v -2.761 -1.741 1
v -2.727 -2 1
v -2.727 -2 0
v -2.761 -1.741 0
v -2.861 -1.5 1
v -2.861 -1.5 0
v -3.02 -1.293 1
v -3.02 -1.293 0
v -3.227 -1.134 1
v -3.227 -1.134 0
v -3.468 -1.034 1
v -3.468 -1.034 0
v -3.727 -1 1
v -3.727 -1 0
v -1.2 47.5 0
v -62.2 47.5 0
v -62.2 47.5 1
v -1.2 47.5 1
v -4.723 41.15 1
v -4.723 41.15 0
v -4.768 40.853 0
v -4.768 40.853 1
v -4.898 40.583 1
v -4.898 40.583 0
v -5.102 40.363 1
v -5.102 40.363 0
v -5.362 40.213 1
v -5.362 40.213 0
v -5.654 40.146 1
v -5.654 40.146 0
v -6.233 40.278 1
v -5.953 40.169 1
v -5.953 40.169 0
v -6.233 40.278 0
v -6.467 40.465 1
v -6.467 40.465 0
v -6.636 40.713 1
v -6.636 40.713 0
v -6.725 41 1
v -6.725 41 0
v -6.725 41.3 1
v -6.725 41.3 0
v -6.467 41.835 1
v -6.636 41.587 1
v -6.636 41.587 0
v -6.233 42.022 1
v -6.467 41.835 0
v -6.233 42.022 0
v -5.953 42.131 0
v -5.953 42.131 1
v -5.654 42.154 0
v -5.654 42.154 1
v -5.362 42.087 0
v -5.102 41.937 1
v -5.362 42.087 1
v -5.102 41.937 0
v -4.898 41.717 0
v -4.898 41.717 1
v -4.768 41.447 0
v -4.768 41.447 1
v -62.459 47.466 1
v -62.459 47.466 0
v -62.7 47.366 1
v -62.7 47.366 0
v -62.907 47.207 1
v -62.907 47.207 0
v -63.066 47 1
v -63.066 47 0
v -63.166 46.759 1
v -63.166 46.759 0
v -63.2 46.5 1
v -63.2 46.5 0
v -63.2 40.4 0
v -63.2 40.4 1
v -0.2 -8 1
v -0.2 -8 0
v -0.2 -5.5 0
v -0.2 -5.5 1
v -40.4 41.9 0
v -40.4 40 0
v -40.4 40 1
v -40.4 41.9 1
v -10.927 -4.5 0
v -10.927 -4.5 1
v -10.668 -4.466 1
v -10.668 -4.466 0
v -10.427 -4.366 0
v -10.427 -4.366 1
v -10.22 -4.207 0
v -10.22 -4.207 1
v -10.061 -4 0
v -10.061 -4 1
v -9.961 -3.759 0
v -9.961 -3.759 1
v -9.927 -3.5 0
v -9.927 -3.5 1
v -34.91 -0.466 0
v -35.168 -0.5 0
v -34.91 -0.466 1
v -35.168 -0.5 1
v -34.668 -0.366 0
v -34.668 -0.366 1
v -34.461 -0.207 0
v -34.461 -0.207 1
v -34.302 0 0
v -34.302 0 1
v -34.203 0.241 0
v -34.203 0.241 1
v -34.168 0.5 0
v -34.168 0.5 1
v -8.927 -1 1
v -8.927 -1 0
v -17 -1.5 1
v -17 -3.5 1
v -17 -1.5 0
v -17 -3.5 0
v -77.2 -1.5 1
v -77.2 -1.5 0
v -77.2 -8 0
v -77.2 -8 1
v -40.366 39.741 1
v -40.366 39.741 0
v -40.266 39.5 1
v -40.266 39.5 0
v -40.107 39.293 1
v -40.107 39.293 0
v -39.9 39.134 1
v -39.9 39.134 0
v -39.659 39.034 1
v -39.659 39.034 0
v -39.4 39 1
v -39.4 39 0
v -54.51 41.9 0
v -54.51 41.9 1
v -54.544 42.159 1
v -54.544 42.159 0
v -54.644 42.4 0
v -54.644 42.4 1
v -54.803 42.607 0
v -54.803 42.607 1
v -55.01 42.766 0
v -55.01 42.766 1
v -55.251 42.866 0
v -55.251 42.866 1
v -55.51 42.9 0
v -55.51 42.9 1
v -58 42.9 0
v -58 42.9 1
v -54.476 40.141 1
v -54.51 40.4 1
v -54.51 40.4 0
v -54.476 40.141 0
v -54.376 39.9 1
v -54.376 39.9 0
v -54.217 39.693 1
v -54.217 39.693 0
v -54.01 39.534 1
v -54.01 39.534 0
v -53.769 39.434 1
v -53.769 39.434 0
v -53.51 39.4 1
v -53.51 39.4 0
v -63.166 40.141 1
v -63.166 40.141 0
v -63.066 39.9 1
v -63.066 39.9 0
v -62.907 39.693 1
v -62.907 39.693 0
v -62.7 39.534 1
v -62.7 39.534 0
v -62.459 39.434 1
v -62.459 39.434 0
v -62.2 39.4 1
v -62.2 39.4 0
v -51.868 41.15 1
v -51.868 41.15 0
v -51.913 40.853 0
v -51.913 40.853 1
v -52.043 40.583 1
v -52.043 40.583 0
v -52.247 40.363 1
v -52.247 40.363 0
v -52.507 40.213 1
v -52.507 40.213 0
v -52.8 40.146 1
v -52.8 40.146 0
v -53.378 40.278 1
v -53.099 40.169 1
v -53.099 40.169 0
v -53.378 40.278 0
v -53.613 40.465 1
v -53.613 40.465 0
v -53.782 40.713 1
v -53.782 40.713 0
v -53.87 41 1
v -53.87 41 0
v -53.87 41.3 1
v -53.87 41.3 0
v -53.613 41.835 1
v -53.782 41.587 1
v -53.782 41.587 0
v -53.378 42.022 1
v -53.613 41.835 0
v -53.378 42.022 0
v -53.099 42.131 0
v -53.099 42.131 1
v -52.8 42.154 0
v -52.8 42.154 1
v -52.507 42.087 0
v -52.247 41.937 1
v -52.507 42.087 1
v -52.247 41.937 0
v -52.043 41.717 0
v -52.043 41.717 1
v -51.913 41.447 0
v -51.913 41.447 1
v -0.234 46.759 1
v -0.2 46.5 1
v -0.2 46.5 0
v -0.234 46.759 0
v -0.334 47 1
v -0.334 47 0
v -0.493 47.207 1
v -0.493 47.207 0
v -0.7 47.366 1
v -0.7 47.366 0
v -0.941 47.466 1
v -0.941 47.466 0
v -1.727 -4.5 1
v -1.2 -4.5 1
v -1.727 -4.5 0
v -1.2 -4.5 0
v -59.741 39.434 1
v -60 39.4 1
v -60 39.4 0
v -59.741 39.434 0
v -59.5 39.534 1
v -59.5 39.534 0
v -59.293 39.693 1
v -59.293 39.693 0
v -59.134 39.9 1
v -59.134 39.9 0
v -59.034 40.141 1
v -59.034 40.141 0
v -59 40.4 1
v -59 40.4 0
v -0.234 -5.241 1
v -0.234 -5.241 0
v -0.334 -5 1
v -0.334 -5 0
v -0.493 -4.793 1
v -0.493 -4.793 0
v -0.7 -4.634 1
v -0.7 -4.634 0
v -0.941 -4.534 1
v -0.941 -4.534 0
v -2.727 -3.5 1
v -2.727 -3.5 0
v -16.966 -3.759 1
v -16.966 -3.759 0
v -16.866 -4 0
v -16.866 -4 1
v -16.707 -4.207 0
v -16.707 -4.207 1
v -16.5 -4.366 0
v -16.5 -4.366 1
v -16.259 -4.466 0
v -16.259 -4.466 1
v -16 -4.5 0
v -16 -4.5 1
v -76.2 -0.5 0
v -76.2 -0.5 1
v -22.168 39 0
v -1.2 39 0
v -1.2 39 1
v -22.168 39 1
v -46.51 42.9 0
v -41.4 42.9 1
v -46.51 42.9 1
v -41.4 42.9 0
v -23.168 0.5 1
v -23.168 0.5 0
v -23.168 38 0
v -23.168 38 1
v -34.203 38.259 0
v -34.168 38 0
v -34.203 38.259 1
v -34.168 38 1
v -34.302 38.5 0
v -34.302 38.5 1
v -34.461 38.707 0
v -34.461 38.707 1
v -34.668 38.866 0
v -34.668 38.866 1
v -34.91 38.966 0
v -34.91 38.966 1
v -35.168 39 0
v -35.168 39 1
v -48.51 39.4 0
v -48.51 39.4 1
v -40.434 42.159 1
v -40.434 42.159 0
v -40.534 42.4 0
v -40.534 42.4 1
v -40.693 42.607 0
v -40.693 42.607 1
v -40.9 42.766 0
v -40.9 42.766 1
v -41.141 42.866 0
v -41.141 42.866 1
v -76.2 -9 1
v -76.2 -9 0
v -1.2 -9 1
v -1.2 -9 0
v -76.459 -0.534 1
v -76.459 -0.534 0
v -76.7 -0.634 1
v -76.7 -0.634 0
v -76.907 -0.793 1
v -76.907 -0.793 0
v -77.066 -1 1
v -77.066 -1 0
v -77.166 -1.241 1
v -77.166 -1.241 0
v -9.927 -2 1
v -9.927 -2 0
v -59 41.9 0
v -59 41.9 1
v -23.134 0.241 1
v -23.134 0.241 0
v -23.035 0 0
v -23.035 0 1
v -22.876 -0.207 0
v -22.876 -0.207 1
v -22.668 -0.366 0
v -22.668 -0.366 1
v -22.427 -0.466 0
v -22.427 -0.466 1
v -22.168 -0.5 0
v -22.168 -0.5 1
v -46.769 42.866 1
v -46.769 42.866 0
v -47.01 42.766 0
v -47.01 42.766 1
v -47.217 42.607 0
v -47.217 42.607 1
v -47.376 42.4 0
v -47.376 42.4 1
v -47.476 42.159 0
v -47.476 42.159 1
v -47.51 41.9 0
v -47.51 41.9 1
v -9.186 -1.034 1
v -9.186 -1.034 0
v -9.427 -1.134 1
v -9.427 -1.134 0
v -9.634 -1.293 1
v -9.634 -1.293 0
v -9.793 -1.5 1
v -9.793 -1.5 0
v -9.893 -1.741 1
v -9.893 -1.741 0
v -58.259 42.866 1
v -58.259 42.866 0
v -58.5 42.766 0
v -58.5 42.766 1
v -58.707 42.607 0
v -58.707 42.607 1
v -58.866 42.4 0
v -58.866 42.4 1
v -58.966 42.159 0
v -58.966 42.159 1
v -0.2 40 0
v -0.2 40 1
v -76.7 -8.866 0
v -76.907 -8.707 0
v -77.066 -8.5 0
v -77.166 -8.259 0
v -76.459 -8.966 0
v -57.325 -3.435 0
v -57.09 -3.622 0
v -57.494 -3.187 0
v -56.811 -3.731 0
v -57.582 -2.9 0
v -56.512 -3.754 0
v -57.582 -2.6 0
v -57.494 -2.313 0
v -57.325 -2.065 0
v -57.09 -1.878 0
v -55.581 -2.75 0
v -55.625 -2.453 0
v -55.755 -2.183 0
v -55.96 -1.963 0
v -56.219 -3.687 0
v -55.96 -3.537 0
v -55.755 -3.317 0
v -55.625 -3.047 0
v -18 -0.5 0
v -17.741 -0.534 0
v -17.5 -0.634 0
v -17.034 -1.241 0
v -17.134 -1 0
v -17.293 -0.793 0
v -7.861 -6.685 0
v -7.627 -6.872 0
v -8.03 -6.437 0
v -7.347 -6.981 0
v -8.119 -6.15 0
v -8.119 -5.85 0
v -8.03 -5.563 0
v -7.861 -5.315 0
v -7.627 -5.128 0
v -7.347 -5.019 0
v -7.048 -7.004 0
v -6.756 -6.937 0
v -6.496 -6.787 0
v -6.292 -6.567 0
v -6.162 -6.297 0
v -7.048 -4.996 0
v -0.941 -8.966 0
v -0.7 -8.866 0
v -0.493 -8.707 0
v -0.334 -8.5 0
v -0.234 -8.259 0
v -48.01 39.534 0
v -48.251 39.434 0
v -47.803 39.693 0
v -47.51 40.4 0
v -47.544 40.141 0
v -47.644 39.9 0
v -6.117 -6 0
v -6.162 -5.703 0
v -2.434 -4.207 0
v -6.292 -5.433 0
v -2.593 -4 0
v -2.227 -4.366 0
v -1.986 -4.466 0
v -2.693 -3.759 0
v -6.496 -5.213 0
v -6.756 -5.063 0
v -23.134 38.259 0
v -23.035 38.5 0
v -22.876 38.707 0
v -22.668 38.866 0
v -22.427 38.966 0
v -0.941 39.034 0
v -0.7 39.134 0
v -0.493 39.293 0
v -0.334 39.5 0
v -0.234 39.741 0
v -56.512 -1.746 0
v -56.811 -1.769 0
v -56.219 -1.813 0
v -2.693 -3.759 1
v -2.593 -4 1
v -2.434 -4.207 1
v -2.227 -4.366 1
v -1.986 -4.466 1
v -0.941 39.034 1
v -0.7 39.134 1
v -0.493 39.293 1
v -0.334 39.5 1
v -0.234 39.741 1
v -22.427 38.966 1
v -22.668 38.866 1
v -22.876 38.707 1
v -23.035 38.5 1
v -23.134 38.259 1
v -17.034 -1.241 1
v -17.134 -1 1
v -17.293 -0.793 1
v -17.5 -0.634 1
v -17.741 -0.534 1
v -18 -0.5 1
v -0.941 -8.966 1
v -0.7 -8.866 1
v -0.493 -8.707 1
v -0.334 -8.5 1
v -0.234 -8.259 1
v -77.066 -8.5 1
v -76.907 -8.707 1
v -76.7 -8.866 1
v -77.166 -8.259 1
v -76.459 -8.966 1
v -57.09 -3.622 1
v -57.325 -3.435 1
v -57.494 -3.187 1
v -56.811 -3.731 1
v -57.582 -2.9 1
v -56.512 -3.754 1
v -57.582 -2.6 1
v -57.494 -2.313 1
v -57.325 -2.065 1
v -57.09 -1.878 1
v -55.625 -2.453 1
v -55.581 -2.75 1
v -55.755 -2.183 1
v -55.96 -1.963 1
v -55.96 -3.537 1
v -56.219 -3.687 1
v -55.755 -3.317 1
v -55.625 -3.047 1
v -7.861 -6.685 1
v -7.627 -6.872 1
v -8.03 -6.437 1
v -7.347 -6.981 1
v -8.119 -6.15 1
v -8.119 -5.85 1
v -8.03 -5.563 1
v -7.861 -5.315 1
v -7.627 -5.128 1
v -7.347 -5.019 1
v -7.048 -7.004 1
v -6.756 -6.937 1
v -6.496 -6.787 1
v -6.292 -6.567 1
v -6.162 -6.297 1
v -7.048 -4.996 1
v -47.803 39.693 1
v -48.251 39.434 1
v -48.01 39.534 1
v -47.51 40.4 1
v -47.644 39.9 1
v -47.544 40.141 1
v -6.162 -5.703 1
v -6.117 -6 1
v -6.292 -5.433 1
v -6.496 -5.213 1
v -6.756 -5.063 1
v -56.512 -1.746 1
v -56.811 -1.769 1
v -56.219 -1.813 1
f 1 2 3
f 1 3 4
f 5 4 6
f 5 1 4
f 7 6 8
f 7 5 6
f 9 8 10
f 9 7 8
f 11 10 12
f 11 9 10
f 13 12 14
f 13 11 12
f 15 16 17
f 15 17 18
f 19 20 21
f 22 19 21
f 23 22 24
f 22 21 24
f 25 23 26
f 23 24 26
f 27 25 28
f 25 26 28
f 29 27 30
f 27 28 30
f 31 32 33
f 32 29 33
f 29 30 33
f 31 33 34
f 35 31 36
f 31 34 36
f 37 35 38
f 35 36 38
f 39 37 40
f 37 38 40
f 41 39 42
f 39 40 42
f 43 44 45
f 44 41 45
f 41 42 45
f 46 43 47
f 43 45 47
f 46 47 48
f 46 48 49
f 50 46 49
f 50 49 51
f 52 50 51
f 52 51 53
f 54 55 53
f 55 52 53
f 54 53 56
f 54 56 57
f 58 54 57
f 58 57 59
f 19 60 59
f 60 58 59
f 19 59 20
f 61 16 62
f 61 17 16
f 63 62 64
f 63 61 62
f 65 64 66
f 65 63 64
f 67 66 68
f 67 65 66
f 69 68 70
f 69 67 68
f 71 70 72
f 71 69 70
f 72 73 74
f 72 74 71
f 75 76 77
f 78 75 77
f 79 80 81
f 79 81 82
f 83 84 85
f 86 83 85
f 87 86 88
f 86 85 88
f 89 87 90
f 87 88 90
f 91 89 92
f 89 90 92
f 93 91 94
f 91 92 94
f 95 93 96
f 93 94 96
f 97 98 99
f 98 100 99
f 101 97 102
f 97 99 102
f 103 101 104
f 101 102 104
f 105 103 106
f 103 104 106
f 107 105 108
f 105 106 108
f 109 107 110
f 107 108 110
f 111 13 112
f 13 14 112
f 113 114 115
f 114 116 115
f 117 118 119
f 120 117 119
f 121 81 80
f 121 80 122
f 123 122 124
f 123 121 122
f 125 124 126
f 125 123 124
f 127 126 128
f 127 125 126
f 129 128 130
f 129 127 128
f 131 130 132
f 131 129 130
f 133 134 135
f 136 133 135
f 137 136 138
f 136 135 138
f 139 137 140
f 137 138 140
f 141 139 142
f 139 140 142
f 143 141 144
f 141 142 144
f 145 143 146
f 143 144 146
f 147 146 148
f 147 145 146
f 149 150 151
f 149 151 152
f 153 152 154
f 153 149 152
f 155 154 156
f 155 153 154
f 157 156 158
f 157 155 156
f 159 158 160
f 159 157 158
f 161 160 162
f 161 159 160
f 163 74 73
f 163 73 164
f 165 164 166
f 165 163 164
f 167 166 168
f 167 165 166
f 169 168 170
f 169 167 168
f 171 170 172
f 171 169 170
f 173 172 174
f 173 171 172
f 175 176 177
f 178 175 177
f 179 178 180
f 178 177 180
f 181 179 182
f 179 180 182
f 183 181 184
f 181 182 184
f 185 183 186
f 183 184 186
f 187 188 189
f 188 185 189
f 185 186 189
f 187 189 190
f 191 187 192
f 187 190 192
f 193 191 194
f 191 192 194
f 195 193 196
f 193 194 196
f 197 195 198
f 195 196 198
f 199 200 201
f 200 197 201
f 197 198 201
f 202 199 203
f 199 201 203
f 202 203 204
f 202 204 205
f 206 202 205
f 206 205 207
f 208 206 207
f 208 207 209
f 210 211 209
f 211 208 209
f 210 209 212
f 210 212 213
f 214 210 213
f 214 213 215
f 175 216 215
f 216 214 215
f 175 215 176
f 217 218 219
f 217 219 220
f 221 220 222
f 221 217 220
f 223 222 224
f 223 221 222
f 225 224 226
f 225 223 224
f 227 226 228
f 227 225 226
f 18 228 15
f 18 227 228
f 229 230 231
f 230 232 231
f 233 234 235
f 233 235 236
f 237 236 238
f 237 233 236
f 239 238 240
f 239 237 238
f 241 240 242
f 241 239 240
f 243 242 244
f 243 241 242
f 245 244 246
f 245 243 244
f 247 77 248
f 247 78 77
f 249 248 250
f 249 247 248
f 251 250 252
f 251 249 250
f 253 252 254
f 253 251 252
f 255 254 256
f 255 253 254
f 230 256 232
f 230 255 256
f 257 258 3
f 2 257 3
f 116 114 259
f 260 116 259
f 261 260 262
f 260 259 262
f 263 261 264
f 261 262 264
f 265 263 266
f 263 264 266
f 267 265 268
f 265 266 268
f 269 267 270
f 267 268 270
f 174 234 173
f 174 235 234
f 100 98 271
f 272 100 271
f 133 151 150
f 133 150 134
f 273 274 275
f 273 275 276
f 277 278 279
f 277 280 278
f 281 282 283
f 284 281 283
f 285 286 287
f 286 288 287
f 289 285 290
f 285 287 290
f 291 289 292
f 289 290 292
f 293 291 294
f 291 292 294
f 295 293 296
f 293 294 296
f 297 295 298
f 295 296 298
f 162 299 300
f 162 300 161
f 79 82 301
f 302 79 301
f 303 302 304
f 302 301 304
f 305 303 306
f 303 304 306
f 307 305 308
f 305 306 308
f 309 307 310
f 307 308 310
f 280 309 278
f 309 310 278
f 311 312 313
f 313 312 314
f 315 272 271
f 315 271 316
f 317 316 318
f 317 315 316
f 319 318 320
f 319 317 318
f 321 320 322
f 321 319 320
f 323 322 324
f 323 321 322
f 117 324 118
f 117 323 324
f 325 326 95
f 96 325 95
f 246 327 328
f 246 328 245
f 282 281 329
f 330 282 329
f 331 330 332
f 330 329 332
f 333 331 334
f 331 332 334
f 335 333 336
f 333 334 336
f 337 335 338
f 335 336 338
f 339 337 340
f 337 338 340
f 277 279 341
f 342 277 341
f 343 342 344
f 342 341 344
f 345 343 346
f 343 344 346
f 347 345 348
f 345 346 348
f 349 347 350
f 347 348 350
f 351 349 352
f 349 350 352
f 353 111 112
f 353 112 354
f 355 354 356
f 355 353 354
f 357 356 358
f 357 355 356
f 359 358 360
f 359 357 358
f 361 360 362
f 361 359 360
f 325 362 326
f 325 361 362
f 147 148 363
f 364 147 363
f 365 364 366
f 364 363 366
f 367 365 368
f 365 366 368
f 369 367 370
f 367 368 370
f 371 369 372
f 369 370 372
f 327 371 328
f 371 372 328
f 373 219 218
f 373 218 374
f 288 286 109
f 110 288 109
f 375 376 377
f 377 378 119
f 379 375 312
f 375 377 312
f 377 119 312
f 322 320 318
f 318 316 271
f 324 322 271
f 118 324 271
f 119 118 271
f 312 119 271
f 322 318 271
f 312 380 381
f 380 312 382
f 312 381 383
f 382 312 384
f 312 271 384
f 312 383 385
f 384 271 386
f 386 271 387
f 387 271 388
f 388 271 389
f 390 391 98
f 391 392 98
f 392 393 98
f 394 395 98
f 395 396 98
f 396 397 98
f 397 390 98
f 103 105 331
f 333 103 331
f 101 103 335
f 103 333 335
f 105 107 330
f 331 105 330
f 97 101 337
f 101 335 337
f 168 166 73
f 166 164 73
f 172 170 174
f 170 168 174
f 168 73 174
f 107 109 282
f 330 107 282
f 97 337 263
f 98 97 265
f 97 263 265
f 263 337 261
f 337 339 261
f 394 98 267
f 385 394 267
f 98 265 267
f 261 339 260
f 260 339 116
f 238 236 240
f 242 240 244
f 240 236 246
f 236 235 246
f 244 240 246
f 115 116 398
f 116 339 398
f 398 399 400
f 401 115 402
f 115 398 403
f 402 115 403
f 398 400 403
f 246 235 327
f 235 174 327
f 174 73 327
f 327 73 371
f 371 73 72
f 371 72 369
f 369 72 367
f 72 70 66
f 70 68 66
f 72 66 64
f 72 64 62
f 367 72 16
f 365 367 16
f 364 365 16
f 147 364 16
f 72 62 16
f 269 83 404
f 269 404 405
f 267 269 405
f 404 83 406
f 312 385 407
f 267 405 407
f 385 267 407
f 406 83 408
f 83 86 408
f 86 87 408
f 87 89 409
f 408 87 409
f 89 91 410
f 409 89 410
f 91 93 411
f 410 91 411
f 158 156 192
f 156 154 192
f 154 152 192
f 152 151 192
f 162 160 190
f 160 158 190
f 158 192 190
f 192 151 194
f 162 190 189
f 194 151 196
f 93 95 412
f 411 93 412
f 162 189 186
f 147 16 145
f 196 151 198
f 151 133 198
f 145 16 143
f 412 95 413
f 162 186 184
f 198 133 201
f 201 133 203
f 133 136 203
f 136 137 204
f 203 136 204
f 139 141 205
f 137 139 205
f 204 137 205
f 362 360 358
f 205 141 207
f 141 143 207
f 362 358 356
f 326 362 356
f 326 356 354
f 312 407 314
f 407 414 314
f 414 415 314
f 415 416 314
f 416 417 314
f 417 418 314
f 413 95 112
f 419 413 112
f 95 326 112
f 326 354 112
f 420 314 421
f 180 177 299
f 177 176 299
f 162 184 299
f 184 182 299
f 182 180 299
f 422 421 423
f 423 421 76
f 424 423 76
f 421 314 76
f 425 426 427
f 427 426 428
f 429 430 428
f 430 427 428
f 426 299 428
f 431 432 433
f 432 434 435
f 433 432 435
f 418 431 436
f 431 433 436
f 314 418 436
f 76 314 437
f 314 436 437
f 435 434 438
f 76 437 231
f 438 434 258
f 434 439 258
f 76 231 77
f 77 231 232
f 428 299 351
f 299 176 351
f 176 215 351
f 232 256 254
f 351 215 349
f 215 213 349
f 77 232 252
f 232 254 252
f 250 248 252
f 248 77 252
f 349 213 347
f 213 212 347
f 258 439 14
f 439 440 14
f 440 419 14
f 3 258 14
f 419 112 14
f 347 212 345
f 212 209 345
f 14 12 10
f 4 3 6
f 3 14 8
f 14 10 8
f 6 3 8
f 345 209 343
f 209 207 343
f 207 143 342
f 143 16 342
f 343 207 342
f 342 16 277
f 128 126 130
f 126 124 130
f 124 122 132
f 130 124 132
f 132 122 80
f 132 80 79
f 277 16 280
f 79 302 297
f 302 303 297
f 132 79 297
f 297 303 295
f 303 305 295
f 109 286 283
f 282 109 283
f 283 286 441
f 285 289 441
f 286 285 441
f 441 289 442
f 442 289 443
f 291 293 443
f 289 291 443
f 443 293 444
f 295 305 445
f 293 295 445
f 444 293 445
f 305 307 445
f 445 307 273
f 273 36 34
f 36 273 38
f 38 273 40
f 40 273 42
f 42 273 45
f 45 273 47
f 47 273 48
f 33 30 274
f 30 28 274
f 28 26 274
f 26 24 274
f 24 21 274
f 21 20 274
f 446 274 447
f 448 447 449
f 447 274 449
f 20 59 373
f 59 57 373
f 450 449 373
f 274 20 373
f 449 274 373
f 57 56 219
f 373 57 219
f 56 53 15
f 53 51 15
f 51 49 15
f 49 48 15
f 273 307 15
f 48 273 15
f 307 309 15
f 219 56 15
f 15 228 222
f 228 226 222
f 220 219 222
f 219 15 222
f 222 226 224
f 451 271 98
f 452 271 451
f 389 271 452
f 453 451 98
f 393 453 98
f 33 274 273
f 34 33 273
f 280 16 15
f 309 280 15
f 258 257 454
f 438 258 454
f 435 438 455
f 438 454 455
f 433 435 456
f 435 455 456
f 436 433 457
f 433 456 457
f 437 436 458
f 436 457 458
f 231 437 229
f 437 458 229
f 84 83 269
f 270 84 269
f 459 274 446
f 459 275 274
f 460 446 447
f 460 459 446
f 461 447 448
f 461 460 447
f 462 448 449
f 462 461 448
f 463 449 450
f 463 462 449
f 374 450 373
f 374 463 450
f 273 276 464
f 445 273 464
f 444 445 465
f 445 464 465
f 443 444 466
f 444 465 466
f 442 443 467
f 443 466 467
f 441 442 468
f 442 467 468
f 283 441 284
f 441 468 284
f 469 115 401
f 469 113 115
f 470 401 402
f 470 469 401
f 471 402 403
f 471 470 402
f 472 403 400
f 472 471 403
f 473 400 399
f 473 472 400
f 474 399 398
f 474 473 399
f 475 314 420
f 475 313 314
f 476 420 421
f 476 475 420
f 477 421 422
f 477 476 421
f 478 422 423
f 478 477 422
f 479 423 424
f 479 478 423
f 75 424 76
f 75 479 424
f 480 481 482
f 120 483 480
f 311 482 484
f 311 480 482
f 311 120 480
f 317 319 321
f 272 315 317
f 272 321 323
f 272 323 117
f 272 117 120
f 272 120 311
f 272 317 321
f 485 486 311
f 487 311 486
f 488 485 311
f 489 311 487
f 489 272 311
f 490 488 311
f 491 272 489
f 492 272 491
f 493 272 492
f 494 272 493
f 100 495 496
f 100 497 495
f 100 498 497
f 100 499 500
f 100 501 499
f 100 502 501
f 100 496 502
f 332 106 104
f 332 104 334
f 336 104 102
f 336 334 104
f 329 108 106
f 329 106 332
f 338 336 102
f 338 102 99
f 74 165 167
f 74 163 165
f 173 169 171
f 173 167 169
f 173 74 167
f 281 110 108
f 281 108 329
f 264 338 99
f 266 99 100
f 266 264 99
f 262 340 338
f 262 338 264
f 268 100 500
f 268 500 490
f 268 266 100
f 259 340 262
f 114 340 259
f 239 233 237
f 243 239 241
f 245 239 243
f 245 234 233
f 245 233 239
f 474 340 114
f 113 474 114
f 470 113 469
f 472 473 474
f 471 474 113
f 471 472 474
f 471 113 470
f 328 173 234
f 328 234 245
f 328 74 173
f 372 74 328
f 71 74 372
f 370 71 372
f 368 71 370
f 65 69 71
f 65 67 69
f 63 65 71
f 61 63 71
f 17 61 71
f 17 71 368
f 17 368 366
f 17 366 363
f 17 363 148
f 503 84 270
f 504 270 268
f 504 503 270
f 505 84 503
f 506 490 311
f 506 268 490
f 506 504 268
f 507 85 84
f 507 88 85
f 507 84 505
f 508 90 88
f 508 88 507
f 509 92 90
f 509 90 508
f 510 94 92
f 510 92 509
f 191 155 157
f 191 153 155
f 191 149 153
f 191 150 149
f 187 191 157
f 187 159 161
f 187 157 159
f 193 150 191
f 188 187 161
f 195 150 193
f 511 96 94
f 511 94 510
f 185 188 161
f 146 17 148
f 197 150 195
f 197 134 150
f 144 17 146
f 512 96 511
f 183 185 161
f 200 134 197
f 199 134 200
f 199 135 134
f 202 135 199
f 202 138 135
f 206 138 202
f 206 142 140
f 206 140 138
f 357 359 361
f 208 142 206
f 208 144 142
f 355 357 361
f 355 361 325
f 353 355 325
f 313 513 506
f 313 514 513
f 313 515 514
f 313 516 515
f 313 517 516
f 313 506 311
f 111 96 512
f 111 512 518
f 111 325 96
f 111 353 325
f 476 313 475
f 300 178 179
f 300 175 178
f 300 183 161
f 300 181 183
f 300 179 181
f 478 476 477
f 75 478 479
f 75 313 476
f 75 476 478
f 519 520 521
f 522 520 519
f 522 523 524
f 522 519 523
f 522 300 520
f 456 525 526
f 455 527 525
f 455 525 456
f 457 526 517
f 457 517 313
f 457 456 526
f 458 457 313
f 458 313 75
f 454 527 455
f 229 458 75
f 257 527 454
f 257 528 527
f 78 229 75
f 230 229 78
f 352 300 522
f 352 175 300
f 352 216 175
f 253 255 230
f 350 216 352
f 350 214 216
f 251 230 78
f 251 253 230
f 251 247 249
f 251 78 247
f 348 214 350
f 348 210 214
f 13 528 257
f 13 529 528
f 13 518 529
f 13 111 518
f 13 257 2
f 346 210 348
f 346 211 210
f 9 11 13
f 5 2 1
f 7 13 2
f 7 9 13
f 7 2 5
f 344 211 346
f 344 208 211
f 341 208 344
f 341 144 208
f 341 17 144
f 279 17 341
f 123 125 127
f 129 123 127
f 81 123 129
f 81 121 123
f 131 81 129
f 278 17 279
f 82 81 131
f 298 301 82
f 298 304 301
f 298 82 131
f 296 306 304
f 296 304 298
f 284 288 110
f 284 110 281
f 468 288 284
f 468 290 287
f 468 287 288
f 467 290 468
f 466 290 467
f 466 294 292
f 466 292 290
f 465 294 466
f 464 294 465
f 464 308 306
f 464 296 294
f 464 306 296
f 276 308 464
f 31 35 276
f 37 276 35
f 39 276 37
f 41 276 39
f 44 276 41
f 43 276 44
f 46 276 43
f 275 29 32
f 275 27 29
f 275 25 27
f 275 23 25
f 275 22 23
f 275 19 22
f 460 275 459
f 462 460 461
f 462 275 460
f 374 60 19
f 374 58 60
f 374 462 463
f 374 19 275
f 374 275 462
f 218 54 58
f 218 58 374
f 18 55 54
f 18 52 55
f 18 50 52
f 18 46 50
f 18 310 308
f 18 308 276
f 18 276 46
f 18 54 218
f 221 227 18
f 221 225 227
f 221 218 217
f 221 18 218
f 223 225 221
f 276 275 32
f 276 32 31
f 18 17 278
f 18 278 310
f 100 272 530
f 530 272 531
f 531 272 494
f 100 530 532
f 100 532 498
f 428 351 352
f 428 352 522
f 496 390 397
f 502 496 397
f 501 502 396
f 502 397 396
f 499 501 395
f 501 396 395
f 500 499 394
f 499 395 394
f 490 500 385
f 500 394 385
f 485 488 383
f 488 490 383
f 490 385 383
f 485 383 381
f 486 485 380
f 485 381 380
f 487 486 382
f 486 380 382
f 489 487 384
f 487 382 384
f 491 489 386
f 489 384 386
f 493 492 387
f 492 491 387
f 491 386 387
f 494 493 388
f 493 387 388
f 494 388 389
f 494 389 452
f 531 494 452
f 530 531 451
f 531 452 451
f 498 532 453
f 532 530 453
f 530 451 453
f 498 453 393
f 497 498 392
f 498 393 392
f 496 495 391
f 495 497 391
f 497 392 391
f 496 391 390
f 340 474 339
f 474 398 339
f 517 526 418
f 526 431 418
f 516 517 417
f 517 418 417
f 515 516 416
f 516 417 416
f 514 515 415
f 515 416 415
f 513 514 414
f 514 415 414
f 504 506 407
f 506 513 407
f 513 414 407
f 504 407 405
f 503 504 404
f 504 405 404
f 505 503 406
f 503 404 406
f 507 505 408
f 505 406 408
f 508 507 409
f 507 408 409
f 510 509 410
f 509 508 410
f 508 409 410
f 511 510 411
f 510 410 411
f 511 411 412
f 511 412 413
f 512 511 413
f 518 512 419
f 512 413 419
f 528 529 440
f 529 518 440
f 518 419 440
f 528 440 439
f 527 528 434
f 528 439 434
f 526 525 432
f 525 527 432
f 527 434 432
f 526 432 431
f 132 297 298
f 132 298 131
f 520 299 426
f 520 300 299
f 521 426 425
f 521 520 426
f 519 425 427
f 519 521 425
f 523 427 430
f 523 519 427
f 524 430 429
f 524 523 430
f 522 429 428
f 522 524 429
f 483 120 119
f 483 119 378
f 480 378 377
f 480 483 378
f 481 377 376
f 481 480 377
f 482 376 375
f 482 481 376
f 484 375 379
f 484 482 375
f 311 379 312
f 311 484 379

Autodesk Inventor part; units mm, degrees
ref_plane "YZ Plane" through (0, 0, 0) normal (1, 0, 0) x (0, 1, 0)
ref_plane "XZ Plane" through (0, 0, 0) normal (0, 1, 0) x (-1, 0, 0)
ref_plane "XY Plane" through (0, 0, 0) normal (0, 0, 1) x (1, 0, 0)
sketch "Sketch1" plane through (0, 0, 0) normal (0, 0, 1) x (1, 0, 0)
  circle A0 centre (-5.7295, 41.15) radius 1.0065 projected
  circle A1 centre (-52.875, 41.15) radius 1.0065 projected
  line L0 (-57.9354, 38.4) -> (-57.9354, 42.4) projected
  line L1 (-57.9354, 42.4) -> (-55.625, 42.4) projected
  line L2 (-55.625, 42.4) -> (-55.625, 38.4) projected
  line L3 (-55.625, 38.4) -> (-46.3947, 38.4) projected
  line L4 (-46.3947, 38.4) -> (-46.3947, 42.4) projected
  line L5 (-46.3947, 42.4) -> (-41.4006, 42.4) projected
  line L6 (-41.4006, 42.4) -> (-41.4006, 38.4) projected
  line L7 (-41.4006, 38.4) -> (0, 38.4) projected
  line L8 (0, 38.4) -> (0, 47.7) projected
  line L9 (0, 47.7) -> (-59.3371, 47.7) projected
  line L10 (-59.3371, 38.4) -> (-59.3371, 47.7) projected
  line L11 (-59.3371, 38.4) -> (-57.9354, 38.4) projected
  circle A2 centre (-56.5871, -2.75) radius 1.0065 projected
  circle A3 centre (-7.1235, -6) radius 1.0065 projected
  line L12 (-15.9365, -4) -> (-15.9365, 0) projected
  line L13 (-59.3371, 0) -> (-15.9365, 0) projected
  line L14 (-59.3371, 0) -> (-59.3371, -9.3) projected
  line L15 (-59.3371, -9.3) -> (0, -9.3) projected
  line L16 (0, -4) -> (0, -9.3) projected
  line L17 (0, -4) -> (-1.712, -4) projected
  line L18 (-1.712, -4) -> (-1.712, 0) projected
  line L19 (-10.9424, 0) -> (-1.712, 0) projected
  line L20 (-10.9424, 0) -> (-10.9424, -4) projected
  line L21 (-10.9424, -4) -> (-15.9365, -4) projected
  line L22 (-77.2, -9) -> (-65.2, -9)
  line L23 (-65.2, -9) -> (-65.2, 11)
  line L24 (-65.2, 11) -> (-77.2, 11)
  line L25 (-77.2, 11) -> (-77.2, -9)
  line L26 (-77.2, -9) -> (-0.2, -9)
  line L27 (-0.2, -9) -> (-0.2, -4.5)
  line L28 (-0.2, -4.5) -> (-2.7272, -4.5)
  line L29 (-2.7272, -4.5) -> (-2.7272, -1)
  line L30 (-2.7272, -1) -> (-9.9272, -1)
  line L31 (-9.9272, -1) -> (-9.9272, -4.5)
  line L32 (-9.9272, -4.5) -> (-17, -4.5)
  line L33 (-17, -4.5) -> (-17, -0.5)
  line L34 (-17, -0.5) -> (-77.2, -0.5)
  line L35 (-61.3371, -12.3) -> (-59.4157, -12.3) projected
  line L36 (-59.4157, -12.3) -> (-59.3371, -12.3) projected
  line L37 (-59.3371, 0) -> (-59.3371, -12.3) projected
  line L38 (-59.3371, 0) -> (-63.3371, 0) projected
  line L39 (-63.3371, 0) -> (-63.3371, -6.8) projected
  line L40 (-63.3371, -6.8) -> (-63.3371, -14.3) projected
  arc A4 (-61.3371, -12.3) -> (-63.3371, -14.3) centre (-61.3371, -14.3) ccw projected
  line L41 (-59.3371, 50.7) -> (-59.4157, 50.7) projected
  line L42 (-59.4157, 50.7) -> (-61.3371, 50.7) projected
  arc A5 (-63.3371, 52.7) -> (-61.3371, 50.7) centre (-61.3371, 52.7) ccw projected
  line L43 (-63.3371, 44.7) -> (-63.3371, 52.7) projected
  line L44 (-63.3371, 38.4) -> (-63.3371, 44.7) projected
  line L45 (-63.3371, 38.4) -> (-59.3371, 38.4) projected
  line L46 (-59.3371, 38.4) -> (-59.3371, 50.7) projected
  line L47 (-63.2, 47.5) -> (-0.2, 47.5)
  line L48 (-0.2, 47.5) -> (-0.2, 39)
  line L49 (-63.2, 39.4) -> (-63.2, 47.5)
  line L50 (6.5, 33.15) -> (-22.9, 33.15) projected
  line L51 (-34.4371, 33.15) -> (-63.8371, 33.15) projected
  line L52 (-34.4371, 5.25) -> (-63.8371, 5.25) projected
  line L53 (6.5, 5.25) -> (-22.9, 5.25) projected
  line L54 (-0.2, 39) -> (-40.4, 39)
  line L55 (-40.4, 39) -> (-40.4, 42.9)
  line L56 (-40.4, 42.9) -> (-47.5099, 42.9)
  line L57 (-47.5099, 42.9) -> (-47.5099, 39.4)
  line L58 (-47.5099, 39.4) -> (-54.5099, 39.4)
  line L59 (-54.5099, 39.4) -> (-54.5099, 42.9)
  line L60 (-54.5099, 42.9) -> (-59, 42.9)
  line L61 (-59, 42.9) -> (-59, 39.4)
  line L62 (-59, 39.4) -> (-63.2, 39.4)
  line L63 (-23.1685, -0.5) -> (-23.1685, 7.5)
  line L64 (-23.1685, 7.5) -> (-23.1685, 7.5)
  line L65 (-23.1685, 7.5) -> (-23.1685, 32.15)
  line L66 (-23.1685, 32.15) -> (-23.1685, 32.15)
  line L67 (-23.1685, 32.15) -> (-23.1685, 39)
  line L68 (-34.1685, 39) -> (-34.1685, 31)
  line L69 (-34.1685, 31) -> (-34.1685, 31)
  line L70 (-34.1685, 31) -> (-34.1685, -0.5)
  point P0 (0, 0)
  point P1 (-23.1685, 38.4)
  point P2 (-34.1685, 38.4)
  dimension "d0" = 12
  dimension "d1" = 20
  dimension "d3" = 0.3
  dimension "d4" = 8.5
  dimension "d5" = 0.5
  dimension "d6" = 4.5
  dimension "d7" = 0.5
  dimension "d8" = 8
  dimension "d9" = 1
  dimension "d10" = 7.2
  dimension "d11" = 1.0152
  dimension "d12" = 1.0152
  dimension "d14" = 0.2
  dimension "d15" = 77
  dimension "d16" = 60.2
  dimension "d17" = 1.0635
  dimension "d18" = 0.2
  dimension "d19" = 0.2
  dimension "d21" = 63
  dimension "d23" = 8.5
  dimension "d24" = 1
  dimension "d25" = 0.5
  dimension "d27" = 4.2
  dimension "d28" = 1.0646
  dimension "d29" = 1.1152
  dimension "d30" = 1.1152
  dimension "d31" = 7
  dimension "d32" = 8.1
  dimension "d33" = 1.0006
  dimension "d34" = 40.2
  dimension "d35" = 8
  dimension "d36" = 8
  dimension "d38" = 0.2685
  dimension "d39" = 0.2685
  dimension "d40" = 11
  dimension "d41" = 0.2685
  dimension "d42" = 0.2685
  dimension "d43" = 1
  dimension "d44" = 0.2685
extrude "Extrusion1" add sketch "Sketch1" along normal blind 1 contours L62 L49 L47 L10 | L10 L47 L48 L54 L55 L56 L57 L58 L59 L60 L61 L62 | L67 L7 L68 L54 | L67 L65 L63 L13 L70 L68 L7 | L13 L63 L34 L70 | L34 L33 L32 L31 L30 L29 L28 L27 L26 L14 | L14 L26 L40 L39 L34 | L39 L40 L26 L23 L34 | L23 L22 L25 L34
fillet "Fillet1" radius 1 26 edges at (-23.1685, 39, 0.5) (-23.1685, -0.5, 0.5) (-17, -0.5, 0.5) (-17, -4.5, 0.5) (-2.7272, -1, 0.5) (-9.9272, -1, 0.5) (-9.9272, -4.5, 0.5) (-2.7272, -4.5, 0.5) (-0.2, -4.5, 0.5) (-0.2, -9, 0.5) (-77.2, -9, 0.5) (-77.2, -0.5, 0.5) (-34.1685, -0.5, 0.5) (-34.1685, 39, 0.5) (-40.4, 39, 0.5) (-40.4, 42.9, 0.5) (-47.5099, 42.9, 0.5) (-47.5099, 39.4, 0.5) (-54.5099, 39.4, 0.5) (-54.5099, 42.9, 0.5) (-59, 42.9, 0.5) (-59, 39.4, 0.5) (-63.2, 39.4, 0.5) (-63.2, 47.5, 0.5) (-0.2, 47.5, 0.5) (-0.2, 39, 0.5)
equation "\"d11\" = d12"
equation "\"d23\" = d4"
equation "\"d25\" = d7"
equation "\"d30\" = d29"
equation "\"d36\" = d35"
equation "\"d39\" = d38"
equation "\"d41\" = d38"
equation "\"d42\" = d39"
equation "\"d44\" = d38"
properties part number "PCB_interface_v2"
